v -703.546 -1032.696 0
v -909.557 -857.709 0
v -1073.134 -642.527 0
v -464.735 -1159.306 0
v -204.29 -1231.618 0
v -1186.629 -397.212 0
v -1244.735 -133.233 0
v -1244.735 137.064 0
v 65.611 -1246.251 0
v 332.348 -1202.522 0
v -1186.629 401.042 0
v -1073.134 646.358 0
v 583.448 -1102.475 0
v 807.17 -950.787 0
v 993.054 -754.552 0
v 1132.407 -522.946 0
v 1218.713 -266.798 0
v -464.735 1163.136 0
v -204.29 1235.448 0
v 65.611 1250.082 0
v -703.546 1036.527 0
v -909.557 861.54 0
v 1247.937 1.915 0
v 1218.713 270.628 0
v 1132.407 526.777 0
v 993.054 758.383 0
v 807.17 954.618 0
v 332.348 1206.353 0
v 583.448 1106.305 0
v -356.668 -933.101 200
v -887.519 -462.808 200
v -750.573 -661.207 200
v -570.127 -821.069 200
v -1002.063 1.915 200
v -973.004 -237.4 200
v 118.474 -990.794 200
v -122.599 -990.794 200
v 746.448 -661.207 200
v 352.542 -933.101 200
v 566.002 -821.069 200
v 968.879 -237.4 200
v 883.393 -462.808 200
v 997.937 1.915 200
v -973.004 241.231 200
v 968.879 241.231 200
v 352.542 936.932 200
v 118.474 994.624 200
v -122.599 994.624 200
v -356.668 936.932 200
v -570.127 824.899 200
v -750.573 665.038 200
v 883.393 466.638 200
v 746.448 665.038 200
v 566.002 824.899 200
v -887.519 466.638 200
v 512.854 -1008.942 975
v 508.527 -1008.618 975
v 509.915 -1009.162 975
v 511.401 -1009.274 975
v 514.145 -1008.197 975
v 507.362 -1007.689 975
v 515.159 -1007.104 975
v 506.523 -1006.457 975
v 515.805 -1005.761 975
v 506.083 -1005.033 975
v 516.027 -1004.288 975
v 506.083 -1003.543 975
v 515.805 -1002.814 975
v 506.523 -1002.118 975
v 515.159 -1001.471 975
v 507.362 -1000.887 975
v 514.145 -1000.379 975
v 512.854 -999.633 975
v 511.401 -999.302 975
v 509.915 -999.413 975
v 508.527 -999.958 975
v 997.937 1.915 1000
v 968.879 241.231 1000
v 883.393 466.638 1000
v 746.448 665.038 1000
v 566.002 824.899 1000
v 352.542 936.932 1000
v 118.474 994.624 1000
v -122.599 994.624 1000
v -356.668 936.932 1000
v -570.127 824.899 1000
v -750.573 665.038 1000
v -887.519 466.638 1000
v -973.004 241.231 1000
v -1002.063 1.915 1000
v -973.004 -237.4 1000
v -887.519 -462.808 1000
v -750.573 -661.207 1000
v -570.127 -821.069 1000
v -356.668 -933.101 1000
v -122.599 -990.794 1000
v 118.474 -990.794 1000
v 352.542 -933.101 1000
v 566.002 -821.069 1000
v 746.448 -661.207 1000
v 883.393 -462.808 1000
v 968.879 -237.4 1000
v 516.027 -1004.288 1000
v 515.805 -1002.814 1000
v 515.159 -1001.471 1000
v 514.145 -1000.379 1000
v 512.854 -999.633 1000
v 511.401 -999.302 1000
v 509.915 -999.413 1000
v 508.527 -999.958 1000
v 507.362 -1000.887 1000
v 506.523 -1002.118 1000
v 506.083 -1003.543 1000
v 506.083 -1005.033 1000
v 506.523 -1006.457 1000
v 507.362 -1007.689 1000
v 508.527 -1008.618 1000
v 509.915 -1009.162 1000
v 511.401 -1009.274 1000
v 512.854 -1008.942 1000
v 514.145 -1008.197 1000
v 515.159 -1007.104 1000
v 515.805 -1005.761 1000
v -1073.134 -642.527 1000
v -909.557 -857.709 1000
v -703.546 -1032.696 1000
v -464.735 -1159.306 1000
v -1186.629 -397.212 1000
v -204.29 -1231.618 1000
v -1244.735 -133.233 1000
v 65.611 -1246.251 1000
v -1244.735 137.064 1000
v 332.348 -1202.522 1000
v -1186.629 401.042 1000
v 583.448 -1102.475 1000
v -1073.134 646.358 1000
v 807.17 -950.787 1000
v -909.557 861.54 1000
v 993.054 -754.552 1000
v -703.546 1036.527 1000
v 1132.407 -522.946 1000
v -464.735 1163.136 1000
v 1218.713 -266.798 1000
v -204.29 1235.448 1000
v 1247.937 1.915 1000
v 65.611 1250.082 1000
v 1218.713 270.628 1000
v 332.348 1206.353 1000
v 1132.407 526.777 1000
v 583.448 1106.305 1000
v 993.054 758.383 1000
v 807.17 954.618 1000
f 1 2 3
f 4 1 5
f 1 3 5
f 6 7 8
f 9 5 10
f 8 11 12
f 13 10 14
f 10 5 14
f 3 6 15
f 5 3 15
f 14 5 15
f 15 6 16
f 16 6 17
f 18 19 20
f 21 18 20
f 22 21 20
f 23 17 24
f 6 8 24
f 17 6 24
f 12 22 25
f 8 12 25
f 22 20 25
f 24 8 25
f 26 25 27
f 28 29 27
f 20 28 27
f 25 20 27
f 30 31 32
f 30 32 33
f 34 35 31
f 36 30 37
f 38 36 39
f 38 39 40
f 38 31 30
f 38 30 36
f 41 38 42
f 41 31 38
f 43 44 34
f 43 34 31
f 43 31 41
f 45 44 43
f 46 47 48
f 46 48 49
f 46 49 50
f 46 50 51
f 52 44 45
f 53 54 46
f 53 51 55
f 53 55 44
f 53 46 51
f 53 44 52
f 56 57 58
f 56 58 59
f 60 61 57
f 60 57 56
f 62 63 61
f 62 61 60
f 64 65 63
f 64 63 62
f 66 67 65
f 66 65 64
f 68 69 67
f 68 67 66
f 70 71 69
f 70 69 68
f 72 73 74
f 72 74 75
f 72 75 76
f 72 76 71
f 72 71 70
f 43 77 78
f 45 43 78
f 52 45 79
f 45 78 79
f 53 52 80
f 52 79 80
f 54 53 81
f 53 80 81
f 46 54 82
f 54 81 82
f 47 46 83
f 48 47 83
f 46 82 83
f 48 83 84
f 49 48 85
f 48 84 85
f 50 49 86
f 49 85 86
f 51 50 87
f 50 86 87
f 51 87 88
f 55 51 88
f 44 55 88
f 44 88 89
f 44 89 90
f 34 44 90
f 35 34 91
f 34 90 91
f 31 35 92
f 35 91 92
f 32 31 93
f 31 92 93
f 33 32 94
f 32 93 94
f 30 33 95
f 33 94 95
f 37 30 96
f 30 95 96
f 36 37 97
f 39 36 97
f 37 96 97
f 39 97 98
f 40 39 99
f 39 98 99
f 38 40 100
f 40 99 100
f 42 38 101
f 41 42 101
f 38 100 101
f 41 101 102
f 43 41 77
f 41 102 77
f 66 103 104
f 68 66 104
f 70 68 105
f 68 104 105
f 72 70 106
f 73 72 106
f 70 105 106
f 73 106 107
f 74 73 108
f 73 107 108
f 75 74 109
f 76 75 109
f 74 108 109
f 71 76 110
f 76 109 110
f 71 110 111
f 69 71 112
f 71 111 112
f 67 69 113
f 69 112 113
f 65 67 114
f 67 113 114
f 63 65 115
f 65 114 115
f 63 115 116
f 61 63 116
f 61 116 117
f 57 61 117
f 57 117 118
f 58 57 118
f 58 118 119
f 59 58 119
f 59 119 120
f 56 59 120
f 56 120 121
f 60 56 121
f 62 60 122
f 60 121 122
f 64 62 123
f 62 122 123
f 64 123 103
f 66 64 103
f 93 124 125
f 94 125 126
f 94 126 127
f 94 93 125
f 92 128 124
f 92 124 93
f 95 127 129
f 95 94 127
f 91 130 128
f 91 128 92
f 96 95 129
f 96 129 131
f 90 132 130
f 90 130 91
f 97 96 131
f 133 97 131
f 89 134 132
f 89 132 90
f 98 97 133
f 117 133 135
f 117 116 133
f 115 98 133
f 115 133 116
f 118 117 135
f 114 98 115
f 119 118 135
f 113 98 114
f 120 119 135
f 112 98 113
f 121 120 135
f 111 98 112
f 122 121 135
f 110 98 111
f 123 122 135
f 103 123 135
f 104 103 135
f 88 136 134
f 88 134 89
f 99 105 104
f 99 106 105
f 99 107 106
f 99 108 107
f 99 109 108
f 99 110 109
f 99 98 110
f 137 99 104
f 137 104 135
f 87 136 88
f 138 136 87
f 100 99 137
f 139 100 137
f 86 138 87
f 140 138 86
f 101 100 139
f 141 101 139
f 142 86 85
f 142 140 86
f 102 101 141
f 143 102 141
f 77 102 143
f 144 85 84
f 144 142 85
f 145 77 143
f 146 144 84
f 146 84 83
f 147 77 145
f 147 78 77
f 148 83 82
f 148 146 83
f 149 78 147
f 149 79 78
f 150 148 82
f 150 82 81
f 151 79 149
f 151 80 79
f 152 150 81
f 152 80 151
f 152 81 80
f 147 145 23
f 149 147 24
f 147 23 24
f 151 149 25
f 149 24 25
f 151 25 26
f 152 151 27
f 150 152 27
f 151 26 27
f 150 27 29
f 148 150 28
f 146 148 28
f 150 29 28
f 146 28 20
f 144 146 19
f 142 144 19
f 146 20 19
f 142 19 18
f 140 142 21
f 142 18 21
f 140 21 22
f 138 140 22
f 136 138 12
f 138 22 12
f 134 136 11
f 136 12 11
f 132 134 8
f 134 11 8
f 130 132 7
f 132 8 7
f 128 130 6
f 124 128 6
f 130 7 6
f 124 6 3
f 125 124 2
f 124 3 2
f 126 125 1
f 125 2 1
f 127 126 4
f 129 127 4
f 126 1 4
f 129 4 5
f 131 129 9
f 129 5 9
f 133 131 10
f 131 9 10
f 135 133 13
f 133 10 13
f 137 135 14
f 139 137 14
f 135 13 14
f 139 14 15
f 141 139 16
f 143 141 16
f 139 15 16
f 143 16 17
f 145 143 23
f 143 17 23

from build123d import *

# Parameters (mm, degrees)
F0_R     = 1250
F1_DEPTH = 1000
F2_R     = 1000
F3_DEPTH = 800
F5_R     = 5
F6_DEPTH = 25


with BuildPart() as f1:
    # F0 (on Top) → F1 (new body)
    with BuildSketch(Plane.XY):
        with Locations((-2.062663, 1.915321)):
            Circle(F0_R)
    extrude(amount=F1_DEPTH)

    # F2 (on face) → F3 (cut)
    with BuildSketch(Plane.XY.offset(1000)):
        with Locations((-2.062663, 1.915321)):
            Circle(F2_R)
    extrude(amount=-F3_DEPTH, mode=Mode.SUBTRACT)

    # F5 (on face) → F6 (cut)
    with BuildSketch(Plane.XY.offset(1000)):
        with Locations((511.027396, -1004.28772)):
            Circle(F5_R)
    extrude(amount=-F6_DEPTH, mode=Mode.SUBTRACT)


solid = f1.part
